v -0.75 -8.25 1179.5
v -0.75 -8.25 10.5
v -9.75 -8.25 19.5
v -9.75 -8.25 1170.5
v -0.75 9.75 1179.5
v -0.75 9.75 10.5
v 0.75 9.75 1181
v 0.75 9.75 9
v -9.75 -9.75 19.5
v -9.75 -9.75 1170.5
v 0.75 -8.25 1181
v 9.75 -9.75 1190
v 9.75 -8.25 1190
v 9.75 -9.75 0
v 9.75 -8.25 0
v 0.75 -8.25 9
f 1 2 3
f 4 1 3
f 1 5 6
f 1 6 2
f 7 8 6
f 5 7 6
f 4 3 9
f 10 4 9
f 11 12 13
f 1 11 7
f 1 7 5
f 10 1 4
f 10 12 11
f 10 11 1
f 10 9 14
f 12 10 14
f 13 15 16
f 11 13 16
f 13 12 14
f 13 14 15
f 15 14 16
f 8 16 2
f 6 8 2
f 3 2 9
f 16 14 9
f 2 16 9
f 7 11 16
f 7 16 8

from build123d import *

# Parameters (mm, degrees)
BOSS_EXTRUDE1_DEPTH     = 1190
CUT_EXTRUDE1_DEPTH      = 1191.176063656
CUT_EXTRUDE1_DEPTH_BACK = 1191.176063656


with BuildPart() as part:
    # Sketch1 → Boss-Extrude1 (new body)
    with BuildSketch(Plane.XY):
        Polygon((-9.75, -9.75), (9.75, -9.75), (9.75, -8.25), (0.75, -8.25), (0.75, 9.75), (-0.75, 9.75), (-0.75, -8.25), (-9.75, -8.25), align=None)
    extrude(amount=BOSS_EXTRUDE1_DEPTH)

    # Sketch2 → Cut-Extrude1 (cut, two sides: drawn at the far end of the back side and taken through both)
    with BuildSketch(Plane(origin=(0, -8.25, 0), x_dir=(1, 0, 0), z_dir=(0, 1, 0)).offset(-CUT_EXTRUDE1_DEPTH_BACK)):
        Polygon((9.75, 0), (-9.75, -19.5), (-15.874453794, -19.5), (-15.874453794, 8.440692937), (9.75, 8.440692937), align=None)
        Polygon((9.75, -1190), (-9.75, -1170.5), (-13.500903001, -1170.5), (-13.500903001, -1195.414043503), (9.75, -1195.414043503), align=None)
    extrude(amount=CUT_EXTRUDE1_DEPTH + CUT_EXTRUDE1_DEPTH_BACK, mode=Mode.SUBTRACT)


solid = part.part
